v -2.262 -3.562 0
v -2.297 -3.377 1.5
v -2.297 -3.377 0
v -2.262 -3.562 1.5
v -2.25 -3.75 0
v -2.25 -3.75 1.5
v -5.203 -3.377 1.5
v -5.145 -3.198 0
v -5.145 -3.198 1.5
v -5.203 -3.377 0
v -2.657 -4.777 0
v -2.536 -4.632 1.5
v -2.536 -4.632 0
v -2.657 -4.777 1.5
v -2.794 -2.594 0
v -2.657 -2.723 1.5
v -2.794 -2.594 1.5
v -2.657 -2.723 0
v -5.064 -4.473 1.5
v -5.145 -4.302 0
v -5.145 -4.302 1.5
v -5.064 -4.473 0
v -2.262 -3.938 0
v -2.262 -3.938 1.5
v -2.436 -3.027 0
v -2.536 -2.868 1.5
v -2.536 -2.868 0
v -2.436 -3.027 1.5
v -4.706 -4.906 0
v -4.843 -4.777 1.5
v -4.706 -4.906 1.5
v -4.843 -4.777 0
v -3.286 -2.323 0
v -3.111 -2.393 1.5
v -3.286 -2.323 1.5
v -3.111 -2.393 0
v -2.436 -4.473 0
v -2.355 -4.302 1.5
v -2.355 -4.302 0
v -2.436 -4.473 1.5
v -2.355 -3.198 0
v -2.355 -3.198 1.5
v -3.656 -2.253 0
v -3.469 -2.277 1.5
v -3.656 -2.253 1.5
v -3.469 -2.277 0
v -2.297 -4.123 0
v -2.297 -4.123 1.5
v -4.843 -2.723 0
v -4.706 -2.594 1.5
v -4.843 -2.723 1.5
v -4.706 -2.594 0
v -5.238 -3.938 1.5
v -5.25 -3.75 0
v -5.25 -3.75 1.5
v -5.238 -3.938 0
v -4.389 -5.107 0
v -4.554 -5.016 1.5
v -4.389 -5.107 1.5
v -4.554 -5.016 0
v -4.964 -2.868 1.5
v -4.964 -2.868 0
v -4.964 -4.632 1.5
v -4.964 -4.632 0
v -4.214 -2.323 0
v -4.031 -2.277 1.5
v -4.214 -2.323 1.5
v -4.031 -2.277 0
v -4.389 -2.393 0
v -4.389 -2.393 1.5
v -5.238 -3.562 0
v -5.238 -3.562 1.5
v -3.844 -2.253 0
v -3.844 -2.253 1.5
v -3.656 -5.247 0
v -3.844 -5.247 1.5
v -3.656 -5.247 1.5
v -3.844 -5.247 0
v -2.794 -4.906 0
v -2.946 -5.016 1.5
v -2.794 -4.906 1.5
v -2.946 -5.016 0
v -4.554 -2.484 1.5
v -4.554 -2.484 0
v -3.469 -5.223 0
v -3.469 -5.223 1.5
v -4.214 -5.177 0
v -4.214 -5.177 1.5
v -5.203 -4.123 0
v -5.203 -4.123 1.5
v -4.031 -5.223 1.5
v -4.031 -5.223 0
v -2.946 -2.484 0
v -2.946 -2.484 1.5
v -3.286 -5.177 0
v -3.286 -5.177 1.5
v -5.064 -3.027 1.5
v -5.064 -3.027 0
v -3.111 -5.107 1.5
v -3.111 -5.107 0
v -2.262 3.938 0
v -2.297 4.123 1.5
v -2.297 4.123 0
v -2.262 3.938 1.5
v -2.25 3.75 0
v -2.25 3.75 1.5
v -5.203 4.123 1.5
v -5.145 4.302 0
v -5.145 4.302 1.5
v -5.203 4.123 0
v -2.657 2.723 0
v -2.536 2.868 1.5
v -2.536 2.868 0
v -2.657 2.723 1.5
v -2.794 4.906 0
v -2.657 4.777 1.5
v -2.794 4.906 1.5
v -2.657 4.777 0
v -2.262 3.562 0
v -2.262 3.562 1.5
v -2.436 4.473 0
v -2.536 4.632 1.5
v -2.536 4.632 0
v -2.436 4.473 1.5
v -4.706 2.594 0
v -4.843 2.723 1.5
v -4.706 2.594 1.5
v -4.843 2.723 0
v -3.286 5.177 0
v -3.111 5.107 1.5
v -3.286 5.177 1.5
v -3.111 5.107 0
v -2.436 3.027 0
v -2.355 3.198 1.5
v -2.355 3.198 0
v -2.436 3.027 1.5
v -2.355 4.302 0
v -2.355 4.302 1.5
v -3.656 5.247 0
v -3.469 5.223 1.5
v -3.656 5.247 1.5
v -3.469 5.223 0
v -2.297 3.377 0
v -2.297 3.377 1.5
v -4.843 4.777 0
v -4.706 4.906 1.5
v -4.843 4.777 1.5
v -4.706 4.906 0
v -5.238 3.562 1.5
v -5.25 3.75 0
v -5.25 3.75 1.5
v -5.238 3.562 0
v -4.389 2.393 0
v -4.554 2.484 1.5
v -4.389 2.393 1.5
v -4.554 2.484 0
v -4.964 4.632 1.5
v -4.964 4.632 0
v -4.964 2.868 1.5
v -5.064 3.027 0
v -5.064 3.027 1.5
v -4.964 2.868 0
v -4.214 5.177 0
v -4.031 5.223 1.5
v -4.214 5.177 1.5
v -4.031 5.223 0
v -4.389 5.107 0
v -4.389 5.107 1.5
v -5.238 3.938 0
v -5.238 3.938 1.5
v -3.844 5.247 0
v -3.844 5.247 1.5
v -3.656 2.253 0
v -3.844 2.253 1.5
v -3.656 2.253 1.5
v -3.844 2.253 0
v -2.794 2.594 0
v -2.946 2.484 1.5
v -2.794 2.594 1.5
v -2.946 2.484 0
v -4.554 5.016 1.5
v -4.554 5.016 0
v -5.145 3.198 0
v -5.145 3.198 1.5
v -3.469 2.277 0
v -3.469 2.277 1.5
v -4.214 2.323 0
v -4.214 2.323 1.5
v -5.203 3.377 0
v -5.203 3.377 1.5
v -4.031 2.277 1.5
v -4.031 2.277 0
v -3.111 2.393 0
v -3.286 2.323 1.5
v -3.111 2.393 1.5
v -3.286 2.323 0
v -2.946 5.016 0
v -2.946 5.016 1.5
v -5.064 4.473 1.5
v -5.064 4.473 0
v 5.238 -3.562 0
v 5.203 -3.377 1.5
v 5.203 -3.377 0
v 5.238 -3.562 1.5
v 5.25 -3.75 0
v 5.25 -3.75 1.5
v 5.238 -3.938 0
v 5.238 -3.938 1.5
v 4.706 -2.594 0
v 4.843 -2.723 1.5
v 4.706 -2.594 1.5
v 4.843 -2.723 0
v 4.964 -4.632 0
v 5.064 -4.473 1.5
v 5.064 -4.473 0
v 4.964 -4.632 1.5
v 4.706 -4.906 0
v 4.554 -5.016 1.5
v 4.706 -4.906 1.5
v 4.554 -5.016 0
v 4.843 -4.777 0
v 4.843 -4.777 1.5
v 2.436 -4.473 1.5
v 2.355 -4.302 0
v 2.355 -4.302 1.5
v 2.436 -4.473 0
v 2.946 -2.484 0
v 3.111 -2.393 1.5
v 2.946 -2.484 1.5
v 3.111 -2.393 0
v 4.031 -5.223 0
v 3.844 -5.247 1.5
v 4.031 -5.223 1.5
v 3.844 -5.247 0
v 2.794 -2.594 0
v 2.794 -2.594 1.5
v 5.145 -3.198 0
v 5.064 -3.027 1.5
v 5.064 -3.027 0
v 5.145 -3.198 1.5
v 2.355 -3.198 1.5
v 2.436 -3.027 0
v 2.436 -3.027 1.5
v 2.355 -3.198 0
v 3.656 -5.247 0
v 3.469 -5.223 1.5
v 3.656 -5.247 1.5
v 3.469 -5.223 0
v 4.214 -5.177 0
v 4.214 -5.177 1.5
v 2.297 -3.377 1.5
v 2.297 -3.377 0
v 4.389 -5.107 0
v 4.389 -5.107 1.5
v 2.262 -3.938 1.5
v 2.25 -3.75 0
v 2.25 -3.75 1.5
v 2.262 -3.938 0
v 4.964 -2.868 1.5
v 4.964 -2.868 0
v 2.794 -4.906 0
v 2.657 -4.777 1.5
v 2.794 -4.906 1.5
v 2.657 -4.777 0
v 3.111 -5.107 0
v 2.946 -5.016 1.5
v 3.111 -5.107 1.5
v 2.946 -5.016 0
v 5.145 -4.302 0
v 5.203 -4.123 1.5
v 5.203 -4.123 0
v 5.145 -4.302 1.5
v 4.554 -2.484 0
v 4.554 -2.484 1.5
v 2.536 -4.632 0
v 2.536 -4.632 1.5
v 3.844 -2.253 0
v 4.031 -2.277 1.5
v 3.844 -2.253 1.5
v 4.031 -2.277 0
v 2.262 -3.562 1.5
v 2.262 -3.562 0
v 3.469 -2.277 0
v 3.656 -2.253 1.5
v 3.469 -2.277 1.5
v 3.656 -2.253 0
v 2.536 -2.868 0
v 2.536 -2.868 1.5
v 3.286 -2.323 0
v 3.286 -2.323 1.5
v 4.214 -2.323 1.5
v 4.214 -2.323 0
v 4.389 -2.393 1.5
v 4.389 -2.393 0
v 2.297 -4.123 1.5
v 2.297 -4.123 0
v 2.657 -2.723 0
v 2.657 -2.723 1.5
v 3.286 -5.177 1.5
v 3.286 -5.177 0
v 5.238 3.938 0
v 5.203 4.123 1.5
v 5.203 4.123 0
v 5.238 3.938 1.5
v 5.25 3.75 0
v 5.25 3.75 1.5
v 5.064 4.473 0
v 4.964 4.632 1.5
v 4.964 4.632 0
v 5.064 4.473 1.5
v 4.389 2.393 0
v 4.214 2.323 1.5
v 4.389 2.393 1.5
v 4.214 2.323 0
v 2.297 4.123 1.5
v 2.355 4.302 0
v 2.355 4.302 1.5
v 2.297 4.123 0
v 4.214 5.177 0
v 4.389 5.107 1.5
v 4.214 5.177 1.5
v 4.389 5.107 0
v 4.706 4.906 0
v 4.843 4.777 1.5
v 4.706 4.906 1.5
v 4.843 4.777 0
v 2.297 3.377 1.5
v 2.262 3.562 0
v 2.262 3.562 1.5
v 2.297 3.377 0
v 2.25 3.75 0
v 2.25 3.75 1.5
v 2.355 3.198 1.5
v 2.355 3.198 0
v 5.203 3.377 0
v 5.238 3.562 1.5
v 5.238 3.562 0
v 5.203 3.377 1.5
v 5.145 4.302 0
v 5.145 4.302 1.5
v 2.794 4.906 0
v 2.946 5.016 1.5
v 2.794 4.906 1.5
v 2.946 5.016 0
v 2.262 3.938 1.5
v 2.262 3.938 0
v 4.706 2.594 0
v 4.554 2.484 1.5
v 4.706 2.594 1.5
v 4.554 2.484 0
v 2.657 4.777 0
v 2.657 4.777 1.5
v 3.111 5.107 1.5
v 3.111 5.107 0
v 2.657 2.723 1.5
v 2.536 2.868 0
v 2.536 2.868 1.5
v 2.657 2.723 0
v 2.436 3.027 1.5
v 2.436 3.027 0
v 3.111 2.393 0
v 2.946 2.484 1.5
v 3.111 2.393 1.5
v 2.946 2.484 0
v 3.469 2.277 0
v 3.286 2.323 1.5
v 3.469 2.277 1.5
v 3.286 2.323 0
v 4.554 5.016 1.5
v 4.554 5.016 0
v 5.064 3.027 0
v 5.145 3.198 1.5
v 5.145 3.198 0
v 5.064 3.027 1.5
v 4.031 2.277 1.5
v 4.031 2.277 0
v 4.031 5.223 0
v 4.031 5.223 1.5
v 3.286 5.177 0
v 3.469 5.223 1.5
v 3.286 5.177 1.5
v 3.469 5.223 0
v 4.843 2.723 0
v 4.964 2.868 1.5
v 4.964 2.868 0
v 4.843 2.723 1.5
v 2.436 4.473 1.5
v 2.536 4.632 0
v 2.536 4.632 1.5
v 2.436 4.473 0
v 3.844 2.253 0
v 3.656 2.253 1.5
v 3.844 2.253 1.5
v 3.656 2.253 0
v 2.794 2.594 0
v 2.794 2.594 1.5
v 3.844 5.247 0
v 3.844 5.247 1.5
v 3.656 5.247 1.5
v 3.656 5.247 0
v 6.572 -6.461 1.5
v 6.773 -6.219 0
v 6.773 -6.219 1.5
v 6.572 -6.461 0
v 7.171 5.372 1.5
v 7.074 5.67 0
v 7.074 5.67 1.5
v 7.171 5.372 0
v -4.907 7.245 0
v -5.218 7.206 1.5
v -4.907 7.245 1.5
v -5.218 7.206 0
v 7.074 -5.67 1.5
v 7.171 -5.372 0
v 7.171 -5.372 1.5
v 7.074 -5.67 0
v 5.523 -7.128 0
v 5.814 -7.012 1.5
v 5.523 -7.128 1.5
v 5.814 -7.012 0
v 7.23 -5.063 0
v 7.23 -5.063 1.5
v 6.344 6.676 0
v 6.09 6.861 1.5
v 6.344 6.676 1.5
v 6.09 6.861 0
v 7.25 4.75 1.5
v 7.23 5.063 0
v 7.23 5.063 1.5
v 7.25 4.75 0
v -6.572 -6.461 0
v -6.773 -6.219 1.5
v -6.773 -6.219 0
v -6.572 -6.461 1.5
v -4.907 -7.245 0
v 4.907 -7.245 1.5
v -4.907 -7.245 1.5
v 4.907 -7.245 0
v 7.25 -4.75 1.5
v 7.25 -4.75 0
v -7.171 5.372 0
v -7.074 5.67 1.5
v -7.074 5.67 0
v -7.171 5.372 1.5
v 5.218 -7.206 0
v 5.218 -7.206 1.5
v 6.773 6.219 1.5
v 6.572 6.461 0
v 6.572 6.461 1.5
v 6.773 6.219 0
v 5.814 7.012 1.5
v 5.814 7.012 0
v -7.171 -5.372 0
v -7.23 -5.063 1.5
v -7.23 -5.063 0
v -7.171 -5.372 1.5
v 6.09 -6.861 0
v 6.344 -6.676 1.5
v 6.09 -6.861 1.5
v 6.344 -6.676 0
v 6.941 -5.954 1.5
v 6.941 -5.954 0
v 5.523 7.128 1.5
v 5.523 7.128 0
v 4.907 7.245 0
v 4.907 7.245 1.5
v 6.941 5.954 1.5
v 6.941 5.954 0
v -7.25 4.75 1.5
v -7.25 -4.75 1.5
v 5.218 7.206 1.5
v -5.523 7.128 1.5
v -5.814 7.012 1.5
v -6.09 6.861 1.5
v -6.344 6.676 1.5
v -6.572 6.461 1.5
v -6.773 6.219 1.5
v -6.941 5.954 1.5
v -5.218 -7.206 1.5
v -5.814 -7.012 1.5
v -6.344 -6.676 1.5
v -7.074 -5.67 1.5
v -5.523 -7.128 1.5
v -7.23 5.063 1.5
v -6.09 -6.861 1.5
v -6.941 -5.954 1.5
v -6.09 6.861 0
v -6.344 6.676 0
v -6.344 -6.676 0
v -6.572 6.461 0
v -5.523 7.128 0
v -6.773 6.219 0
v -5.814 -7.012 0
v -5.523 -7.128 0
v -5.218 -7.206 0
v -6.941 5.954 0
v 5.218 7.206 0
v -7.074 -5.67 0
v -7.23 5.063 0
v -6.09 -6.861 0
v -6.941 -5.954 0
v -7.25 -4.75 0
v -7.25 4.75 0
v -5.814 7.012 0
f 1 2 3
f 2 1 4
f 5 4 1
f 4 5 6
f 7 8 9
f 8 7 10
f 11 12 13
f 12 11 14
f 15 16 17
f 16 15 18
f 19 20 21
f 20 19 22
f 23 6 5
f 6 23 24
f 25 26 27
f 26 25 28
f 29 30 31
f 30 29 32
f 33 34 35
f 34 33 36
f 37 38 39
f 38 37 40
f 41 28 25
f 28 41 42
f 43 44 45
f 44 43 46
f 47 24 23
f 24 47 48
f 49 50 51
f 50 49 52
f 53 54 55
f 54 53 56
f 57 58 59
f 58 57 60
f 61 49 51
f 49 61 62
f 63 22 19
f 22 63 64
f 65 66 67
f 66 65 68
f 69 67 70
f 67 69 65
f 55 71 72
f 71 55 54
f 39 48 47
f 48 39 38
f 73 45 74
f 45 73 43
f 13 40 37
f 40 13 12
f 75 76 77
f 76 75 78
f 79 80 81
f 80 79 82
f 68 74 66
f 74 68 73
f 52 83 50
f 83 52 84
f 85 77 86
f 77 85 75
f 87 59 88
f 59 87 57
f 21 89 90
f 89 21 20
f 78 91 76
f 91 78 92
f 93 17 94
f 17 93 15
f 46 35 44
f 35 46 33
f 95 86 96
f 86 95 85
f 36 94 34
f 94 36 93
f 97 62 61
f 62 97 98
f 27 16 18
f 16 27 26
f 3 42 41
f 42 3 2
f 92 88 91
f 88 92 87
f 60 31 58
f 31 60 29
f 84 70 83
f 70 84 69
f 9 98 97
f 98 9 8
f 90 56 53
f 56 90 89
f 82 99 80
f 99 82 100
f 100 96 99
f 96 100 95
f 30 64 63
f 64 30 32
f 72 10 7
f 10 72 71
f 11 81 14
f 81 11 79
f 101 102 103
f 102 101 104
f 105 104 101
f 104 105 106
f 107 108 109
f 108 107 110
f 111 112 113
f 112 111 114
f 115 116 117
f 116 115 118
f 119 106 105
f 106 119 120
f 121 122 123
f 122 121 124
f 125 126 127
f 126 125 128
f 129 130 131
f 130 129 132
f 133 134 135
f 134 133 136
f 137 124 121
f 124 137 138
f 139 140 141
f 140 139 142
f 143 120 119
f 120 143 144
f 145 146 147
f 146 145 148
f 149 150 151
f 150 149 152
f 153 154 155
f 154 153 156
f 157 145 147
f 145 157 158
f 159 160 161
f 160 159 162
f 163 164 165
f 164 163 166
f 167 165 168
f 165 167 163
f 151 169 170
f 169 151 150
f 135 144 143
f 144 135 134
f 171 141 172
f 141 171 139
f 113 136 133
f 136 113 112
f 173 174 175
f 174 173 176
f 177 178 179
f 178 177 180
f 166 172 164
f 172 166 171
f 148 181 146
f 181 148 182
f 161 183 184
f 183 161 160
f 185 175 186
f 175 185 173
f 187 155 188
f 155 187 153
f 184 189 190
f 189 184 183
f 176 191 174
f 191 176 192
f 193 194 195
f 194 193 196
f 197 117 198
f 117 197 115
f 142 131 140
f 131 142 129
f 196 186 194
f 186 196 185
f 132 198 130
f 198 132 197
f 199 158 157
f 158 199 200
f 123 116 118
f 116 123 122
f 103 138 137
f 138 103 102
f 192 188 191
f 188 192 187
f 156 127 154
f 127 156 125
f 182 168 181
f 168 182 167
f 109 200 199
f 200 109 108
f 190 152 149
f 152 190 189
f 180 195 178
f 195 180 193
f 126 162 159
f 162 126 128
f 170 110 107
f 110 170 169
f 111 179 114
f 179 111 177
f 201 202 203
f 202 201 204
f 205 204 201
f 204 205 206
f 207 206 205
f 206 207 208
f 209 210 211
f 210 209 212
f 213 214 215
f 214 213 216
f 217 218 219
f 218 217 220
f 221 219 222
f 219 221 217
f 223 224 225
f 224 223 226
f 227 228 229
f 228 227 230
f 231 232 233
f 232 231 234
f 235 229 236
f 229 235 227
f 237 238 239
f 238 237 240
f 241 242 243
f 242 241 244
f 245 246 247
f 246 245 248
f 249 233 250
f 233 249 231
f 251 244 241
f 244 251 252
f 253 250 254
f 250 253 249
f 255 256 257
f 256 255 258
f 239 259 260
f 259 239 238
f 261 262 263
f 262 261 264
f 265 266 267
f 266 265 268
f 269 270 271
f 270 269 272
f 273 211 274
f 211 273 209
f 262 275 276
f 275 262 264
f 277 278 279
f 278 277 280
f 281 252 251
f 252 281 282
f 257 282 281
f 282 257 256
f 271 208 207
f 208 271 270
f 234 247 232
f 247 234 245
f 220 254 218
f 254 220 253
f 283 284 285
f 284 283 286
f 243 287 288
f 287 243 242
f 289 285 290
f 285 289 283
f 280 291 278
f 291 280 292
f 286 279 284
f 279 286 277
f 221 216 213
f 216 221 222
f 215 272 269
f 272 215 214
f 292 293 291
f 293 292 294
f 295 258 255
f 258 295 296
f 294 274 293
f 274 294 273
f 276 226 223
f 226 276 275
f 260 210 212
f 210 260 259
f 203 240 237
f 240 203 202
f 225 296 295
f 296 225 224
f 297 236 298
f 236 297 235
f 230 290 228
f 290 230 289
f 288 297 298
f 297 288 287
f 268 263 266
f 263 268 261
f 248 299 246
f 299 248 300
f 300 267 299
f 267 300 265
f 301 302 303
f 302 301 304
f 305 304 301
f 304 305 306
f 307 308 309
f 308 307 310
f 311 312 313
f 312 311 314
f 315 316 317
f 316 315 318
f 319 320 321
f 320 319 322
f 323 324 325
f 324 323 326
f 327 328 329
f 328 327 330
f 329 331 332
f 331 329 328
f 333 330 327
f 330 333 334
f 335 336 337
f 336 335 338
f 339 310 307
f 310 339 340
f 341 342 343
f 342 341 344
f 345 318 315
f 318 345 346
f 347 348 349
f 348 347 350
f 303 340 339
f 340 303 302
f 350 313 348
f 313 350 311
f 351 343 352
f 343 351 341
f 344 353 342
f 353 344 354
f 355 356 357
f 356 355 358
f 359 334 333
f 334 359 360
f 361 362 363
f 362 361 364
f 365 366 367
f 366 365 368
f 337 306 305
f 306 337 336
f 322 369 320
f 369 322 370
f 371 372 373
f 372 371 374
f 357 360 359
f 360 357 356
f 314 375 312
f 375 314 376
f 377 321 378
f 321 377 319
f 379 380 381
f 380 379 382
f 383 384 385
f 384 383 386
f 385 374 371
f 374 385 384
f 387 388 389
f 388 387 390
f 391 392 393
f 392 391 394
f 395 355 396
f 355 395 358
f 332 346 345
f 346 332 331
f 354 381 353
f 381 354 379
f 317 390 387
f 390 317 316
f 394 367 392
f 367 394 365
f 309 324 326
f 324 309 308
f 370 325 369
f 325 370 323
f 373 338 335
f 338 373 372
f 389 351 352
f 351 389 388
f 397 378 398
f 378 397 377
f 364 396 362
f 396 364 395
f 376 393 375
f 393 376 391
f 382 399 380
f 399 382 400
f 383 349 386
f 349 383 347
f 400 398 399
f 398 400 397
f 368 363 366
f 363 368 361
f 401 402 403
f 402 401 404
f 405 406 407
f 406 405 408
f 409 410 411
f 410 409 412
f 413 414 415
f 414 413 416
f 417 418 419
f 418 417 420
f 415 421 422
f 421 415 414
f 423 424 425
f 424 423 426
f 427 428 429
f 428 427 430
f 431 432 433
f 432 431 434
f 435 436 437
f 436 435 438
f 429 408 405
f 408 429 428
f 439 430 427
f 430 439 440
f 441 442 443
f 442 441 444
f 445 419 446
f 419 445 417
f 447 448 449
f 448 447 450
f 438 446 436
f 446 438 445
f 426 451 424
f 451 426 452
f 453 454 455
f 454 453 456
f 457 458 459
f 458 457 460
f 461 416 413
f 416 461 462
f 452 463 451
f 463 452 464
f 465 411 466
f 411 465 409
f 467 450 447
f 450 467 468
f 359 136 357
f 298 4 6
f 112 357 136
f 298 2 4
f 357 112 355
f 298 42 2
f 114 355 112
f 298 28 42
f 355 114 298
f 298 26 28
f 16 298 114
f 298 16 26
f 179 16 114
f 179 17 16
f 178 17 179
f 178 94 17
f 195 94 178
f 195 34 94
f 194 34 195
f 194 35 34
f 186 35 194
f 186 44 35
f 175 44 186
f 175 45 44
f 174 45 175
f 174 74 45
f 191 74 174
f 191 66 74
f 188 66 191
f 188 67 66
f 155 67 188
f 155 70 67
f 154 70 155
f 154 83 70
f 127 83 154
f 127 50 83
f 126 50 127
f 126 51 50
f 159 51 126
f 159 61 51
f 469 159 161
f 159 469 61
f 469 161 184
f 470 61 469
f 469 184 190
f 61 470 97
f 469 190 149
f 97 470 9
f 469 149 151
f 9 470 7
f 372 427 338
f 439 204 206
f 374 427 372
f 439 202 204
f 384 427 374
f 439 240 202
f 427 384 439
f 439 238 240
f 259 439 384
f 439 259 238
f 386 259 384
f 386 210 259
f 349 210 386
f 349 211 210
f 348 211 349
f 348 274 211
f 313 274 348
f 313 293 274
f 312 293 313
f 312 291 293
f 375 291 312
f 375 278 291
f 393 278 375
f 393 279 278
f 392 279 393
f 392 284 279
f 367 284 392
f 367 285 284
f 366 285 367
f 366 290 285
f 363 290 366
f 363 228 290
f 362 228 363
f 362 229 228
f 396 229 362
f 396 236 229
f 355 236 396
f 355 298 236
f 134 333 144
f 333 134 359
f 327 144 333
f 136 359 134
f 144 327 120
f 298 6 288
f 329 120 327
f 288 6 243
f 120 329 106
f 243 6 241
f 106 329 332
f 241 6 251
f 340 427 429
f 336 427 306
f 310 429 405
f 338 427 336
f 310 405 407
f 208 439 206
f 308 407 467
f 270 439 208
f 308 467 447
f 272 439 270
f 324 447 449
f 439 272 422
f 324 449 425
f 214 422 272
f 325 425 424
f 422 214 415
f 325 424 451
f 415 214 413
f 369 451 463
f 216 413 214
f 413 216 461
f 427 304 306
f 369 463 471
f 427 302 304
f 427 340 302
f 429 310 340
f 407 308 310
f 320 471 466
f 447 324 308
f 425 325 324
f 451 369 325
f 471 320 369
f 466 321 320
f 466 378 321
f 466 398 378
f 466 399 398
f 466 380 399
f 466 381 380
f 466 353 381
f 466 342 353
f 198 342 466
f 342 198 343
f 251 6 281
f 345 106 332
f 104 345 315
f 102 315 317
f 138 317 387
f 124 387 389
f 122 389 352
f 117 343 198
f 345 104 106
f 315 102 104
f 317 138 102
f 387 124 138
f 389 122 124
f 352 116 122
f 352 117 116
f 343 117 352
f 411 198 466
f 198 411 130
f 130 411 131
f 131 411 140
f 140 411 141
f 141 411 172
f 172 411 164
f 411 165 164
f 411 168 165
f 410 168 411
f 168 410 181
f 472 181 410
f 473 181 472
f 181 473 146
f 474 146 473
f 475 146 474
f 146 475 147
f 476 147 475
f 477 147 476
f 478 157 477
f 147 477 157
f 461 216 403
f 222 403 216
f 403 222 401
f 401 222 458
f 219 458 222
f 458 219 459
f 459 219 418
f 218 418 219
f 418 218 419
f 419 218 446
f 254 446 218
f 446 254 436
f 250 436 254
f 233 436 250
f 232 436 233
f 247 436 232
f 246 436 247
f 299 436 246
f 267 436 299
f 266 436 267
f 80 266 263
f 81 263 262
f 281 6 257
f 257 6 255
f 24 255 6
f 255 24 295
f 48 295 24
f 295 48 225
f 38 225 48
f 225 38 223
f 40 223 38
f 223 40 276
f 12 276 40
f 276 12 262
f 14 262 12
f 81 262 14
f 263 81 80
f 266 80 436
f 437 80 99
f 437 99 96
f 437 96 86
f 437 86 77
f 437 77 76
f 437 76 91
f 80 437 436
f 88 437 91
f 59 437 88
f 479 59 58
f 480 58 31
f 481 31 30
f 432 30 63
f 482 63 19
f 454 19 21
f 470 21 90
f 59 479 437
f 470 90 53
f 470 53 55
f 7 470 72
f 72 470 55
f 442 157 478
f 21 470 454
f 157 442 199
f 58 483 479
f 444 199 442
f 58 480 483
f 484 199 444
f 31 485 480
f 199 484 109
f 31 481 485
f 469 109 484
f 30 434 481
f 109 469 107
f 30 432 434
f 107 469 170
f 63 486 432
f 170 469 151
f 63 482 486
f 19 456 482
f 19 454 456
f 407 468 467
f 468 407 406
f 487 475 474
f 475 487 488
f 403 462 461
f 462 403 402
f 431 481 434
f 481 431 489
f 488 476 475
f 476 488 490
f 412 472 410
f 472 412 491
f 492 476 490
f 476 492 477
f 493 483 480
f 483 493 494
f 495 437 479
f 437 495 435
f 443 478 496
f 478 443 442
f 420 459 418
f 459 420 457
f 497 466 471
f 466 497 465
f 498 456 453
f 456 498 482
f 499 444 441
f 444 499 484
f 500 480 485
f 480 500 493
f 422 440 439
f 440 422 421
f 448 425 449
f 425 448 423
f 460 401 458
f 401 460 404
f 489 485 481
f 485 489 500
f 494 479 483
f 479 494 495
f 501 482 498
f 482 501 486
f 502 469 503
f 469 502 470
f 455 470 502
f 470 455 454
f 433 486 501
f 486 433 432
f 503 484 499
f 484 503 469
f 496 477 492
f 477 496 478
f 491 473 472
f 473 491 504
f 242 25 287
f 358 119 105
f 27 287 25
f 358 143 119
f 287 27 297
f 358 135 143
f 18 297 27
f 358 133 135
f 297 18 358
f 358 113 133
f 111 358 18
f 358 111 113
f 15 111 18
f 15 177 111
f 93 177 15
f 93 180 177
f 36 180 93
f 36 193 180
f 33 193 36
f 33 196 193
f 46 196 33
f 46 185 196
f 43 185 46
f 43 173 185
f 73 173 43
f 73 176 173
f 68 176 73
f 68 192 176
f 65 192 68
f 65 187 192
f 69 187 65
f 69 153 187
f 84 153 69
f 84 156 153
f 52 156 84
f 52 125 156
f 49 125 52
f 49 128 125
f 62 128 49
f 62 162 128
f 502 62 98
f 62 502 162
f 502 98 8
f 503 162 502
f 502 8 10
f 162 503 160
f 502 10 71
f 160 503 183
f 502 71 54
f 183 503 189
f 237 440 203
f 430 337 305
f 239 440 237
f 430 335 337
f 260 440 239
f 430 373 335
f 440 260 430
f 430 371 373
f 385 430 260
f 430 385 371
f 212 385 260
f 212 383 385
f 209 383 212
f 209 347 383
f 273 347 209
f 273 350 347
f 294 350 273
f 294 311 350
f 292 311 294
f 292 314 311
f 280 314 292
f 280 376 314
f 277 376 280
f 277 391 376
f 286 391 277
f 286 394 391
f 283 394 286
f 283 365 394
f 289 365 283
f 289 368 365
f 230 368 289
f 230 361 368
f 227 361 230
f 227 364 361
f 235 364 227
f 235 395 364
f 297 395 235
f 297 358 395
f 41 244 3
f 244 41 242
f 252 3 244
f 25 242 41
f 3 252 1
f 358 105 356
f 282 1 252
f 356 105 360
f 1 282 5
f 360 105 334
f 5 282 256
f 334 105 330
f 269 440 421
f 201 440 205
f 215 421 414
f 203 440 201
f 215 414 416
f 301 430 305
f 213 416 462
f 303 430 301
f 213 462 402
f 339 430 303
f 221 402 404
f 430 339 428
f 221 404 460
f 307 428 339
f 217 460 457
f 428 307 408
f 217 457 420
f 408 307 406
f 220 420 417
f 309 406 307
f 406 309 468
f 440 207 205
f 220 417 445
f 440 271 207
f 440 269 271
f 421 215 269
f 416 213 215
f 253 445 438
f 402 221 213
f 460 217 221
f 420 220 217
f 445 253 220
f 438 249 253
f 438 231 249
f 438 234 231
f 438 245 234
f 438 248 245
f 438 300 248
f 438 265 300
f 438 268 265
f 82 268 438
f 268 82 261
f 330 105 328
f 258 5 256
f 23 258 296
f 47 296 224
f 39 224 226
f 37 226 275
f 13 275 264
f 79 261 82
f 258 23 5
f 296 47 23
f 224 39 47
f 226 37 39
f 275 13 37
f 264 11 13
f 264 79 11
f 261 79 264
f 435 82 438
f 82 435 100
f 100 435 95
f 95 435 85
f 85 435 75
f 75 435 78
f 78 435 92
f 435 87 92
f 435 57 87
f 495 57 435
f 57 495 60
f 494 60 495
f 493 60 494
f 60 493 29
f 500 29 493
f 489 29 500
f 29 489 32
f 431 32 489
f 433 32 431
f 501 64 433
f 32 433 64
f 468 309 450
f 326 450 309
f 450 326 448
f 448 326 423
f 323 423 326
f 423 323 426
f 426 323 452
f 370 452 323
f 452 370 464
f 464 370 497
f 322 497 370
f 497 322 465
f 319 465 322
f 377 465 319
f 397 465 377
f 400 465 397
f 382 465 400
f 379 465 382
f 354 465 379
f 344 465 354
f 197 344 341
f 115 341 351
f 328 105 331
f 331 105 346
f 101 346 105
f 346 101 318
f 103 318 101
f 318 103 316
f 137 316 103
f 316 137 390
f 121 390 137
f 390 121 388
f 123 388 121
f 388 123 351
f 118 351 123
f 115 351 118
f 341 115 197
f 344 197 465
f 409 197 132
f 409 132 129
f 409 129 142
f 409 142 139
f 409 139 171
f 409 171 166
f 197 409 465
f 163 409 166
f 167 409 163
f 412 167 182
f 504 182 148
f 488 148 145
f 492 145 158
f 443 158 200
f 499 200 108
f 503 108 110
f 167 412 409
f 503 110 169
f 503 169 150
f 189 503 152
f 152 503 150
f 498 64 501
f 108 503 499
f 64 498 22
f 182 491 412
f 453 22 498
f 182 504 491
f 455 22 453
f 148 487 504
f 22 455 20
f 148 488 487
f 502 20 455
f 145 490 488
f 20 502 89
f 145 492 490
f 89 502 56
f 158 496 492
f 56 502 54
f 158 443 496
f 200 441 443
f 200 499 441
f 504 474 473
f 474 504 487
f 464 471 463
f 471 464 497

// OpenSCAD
$fn = 50;


difference() {
	union() {
		translate(v = [0, 0, 0]) {
			rotate(a = [0, 0, 0]) {
				hull() {
					translate(v = [-4.7500000000, 4.7500000000, 0]) {
						rotate(a = [0, 0, 0]) {
							translate(v = [0, 0, 0]) {
								rotate(a = [0, 0, 0]) {
									cylinder(h = 1.5000000000, r = 2.5000000000);
								}
							}
						}
					}
					translate(v = [4.7500000000, 4.7500000000, 0]) {
						rotate(a = [0, 0, 0]) {
							translate(v = [0, 0, 0]) {
								rotate(a = [0, 0, 0]) {
									cylinder(h = 1.5000000000, r = 2.5000000000);
								}
							}
						}
					}
					translate(v = [-4.7500000000, -4.7500000000, 0]) {
						rotate(a = [0, 0, 0]) {
							translate(v = [0, 0, 0]) {
								rotate(a = [0, 0, 0]) {
									cylinder(h = 1.5000000000, r = 2.5000000000);
								}
							}
						}
					}
					translate(v = [4.7500000000, -4.7500000000, 0]) {
						rotate(a = [0, 0, 0]) {
							translate(v = [0, 0, 0]) {
								rotate(a = [0, 0, 0]) {
									cylinder(h = 1.5000000000, r = 2.5000000000);
								}
							}
						}
					}
				}
			}
		}
	}
	union() {
		translate(v = [-3.7500000000, -3.7500000000, 0]) {
			rotate(a = [0, 0, 0]) {
				translate(v = [0, 0, -50]) {
					rotate(a = [0, 0, 0]) {
						cylinder(h = 100, r = 1.5000000000);
					}
				}
			}
		}
		translate(v = [-3.7500000000, 3.7500000000, 0]) {
			rotate(a = [0, 0, 0]) {
				translate(v = [0, 0, -50]) {
					rotate(a = [0, 0, 0]) {
						cylinder(h = 100, r = 1.5000000000);
					}
				}
			}
		}
		translate(v = [3.7500000000, -3.7500000000, 0]) {
			rotate(a = [0, 0, 0]) {
				translate(v = [0, 0, -50]) {
					rotate(a = [0, 0, 0]) {
						cylinder(h = 100, r = 1.5000000000);
					}
				}
			}
		}
		translate(v = [3.7500000000, 3.7500000000, 0]) {
			rotate(a = [0, 0, 0]) {
				translate(v = [0, 0, -50]) {
					rotate(a = [0, 0, 0]) {
						cylinder(h = 100, r = 1.5000000000);
					}
				}
			}
		}
	}
}
